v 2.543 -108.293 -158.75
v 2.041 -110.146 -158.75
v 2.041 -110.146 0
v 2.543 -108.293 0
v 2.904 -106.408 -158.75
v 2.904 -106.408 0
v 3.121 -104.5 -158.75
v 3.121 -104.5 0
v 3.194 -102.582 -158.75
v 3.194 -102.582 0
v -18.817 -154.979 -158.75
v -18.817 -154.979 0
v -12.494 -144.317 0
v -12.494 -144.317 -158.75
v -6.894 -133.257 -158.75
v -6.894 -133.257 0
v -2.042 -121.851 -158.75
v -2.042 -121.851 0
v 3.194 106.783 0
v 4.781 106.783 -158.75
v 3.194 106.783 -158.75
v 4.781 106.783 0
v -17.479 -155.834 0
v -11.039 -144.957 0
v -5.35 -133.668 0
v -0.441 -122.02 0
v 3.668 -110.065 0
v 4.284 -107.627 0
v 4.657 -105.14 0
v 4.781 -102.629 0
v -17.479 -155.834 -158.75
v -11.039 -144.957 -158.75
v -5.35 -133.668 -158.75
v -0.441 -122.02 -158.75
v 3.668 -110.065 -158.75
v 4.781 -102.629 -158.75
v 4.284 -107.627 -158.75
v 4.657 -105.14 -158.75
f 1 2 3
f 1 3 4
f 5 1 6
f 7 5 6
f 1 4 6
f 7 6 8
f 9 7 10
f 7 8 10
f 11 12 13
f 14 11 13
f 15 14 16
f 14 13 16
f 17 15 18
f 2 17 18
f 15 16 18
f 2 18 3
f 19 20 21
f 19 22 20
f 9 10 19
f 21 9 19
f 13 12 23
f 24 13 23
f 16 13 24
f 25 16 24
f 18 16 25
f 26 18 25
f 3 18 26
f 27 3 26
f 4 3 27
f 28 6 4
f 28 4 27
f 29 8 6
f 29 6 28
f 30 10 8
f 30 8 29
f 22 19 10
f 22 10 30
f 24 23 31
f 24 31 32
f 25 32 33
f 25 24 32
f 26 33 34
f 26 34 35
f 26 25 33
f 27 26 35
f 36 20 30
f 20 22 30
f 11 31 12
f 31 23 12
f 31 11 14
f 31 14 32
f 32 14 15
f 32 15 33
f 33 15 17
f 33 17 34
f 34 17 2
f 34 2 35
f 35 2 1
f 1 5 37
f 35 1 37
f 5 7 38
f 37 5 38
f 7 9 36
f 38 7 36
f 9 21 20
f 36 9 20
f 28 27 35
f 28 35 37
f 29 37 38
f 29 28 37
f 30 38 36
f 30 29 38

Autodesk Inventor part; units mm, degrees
ref_plane "YZ Plane" through (0, 0, 0) normal (1, 0, 0) x (0, 1, 0)
ref_plane "XZ Plane" through (0, 0, 0) normal (0, 1, 0) x (-1, 0, 0)
ref_plane "XY Plane" through (0, 0, 0) normal (0, 0, 1) x (1, 0, 0)
ref_plane "Work Plane1" through (0, 0, 0) normal (0, 0, 1) x (1, 0, 0)
sketch "Sketch1" plane through (0, 0, 0) normal (0, 0, 1) x (1, 0, 0)
  line L0 (-5.0952, -133.1293) -> (-4.7767, -132.9202) construction
  arc A0 (-5.0952, -133.1293) -> (-0.7466, -139.7544) centre (-1.0882, -135.2389) ccw construction
  line L1 (4.7811, 106.7831) -> (4.7811, -102.6288)
  arc A1 (-17.4789, -155.8337) -> (3.6681, -110.0654) centre (-174.5174, -55.5054) ccw
  line L2 (4.7811, 106.7831) -> (3.1936, 106.7831)
  line L3 (4.7811, -105.9343) -> (6.3686, -105.9343) construction
  line L4 (3.1936, -102.5821) -> (3.1936, 106.7831)
  line L5 (-17.4789, -155.8337) -> (-18.8167, -154.979)
  line L6 (-174.5174, -55.5054) -> (-175.8552, -54.6508)
  line L7 (-174.5174, -55.5054) -> (-172.9299, -55.5054) construction
  arc A2 (-18.8167, -154.979) -> (2.0412, -110.1462) centre (-175.8552, -54.6508) ccw
  line L8 (3.1936, -105.9343) -> (3.1936, -105.9468)
  arc A3 (2.0412, -110.1462) -> (3.1936, -102.5821) centre (-22.2064, -102.5821) ccw
  arc A4 (3.6681, -110.0654) -> (4.7811, -102.6288) centre (-20.6189, -102.6288) ccw
  point P0 (0, 0)
  point P1 (4.7811, -106.2883)
  dimension "d1" = 1.5875
  dimension "d6" = 1.5875
  dimension "d7" = 1.5875
  dimension "d8" = 147.426
  dimension "d13" = 25.4
extrude "Extrusion1" add sketch "Sketch1" against normal blind 158.75
properties part number "Intake main polycarb" material "Polycarbonate, Clear"
